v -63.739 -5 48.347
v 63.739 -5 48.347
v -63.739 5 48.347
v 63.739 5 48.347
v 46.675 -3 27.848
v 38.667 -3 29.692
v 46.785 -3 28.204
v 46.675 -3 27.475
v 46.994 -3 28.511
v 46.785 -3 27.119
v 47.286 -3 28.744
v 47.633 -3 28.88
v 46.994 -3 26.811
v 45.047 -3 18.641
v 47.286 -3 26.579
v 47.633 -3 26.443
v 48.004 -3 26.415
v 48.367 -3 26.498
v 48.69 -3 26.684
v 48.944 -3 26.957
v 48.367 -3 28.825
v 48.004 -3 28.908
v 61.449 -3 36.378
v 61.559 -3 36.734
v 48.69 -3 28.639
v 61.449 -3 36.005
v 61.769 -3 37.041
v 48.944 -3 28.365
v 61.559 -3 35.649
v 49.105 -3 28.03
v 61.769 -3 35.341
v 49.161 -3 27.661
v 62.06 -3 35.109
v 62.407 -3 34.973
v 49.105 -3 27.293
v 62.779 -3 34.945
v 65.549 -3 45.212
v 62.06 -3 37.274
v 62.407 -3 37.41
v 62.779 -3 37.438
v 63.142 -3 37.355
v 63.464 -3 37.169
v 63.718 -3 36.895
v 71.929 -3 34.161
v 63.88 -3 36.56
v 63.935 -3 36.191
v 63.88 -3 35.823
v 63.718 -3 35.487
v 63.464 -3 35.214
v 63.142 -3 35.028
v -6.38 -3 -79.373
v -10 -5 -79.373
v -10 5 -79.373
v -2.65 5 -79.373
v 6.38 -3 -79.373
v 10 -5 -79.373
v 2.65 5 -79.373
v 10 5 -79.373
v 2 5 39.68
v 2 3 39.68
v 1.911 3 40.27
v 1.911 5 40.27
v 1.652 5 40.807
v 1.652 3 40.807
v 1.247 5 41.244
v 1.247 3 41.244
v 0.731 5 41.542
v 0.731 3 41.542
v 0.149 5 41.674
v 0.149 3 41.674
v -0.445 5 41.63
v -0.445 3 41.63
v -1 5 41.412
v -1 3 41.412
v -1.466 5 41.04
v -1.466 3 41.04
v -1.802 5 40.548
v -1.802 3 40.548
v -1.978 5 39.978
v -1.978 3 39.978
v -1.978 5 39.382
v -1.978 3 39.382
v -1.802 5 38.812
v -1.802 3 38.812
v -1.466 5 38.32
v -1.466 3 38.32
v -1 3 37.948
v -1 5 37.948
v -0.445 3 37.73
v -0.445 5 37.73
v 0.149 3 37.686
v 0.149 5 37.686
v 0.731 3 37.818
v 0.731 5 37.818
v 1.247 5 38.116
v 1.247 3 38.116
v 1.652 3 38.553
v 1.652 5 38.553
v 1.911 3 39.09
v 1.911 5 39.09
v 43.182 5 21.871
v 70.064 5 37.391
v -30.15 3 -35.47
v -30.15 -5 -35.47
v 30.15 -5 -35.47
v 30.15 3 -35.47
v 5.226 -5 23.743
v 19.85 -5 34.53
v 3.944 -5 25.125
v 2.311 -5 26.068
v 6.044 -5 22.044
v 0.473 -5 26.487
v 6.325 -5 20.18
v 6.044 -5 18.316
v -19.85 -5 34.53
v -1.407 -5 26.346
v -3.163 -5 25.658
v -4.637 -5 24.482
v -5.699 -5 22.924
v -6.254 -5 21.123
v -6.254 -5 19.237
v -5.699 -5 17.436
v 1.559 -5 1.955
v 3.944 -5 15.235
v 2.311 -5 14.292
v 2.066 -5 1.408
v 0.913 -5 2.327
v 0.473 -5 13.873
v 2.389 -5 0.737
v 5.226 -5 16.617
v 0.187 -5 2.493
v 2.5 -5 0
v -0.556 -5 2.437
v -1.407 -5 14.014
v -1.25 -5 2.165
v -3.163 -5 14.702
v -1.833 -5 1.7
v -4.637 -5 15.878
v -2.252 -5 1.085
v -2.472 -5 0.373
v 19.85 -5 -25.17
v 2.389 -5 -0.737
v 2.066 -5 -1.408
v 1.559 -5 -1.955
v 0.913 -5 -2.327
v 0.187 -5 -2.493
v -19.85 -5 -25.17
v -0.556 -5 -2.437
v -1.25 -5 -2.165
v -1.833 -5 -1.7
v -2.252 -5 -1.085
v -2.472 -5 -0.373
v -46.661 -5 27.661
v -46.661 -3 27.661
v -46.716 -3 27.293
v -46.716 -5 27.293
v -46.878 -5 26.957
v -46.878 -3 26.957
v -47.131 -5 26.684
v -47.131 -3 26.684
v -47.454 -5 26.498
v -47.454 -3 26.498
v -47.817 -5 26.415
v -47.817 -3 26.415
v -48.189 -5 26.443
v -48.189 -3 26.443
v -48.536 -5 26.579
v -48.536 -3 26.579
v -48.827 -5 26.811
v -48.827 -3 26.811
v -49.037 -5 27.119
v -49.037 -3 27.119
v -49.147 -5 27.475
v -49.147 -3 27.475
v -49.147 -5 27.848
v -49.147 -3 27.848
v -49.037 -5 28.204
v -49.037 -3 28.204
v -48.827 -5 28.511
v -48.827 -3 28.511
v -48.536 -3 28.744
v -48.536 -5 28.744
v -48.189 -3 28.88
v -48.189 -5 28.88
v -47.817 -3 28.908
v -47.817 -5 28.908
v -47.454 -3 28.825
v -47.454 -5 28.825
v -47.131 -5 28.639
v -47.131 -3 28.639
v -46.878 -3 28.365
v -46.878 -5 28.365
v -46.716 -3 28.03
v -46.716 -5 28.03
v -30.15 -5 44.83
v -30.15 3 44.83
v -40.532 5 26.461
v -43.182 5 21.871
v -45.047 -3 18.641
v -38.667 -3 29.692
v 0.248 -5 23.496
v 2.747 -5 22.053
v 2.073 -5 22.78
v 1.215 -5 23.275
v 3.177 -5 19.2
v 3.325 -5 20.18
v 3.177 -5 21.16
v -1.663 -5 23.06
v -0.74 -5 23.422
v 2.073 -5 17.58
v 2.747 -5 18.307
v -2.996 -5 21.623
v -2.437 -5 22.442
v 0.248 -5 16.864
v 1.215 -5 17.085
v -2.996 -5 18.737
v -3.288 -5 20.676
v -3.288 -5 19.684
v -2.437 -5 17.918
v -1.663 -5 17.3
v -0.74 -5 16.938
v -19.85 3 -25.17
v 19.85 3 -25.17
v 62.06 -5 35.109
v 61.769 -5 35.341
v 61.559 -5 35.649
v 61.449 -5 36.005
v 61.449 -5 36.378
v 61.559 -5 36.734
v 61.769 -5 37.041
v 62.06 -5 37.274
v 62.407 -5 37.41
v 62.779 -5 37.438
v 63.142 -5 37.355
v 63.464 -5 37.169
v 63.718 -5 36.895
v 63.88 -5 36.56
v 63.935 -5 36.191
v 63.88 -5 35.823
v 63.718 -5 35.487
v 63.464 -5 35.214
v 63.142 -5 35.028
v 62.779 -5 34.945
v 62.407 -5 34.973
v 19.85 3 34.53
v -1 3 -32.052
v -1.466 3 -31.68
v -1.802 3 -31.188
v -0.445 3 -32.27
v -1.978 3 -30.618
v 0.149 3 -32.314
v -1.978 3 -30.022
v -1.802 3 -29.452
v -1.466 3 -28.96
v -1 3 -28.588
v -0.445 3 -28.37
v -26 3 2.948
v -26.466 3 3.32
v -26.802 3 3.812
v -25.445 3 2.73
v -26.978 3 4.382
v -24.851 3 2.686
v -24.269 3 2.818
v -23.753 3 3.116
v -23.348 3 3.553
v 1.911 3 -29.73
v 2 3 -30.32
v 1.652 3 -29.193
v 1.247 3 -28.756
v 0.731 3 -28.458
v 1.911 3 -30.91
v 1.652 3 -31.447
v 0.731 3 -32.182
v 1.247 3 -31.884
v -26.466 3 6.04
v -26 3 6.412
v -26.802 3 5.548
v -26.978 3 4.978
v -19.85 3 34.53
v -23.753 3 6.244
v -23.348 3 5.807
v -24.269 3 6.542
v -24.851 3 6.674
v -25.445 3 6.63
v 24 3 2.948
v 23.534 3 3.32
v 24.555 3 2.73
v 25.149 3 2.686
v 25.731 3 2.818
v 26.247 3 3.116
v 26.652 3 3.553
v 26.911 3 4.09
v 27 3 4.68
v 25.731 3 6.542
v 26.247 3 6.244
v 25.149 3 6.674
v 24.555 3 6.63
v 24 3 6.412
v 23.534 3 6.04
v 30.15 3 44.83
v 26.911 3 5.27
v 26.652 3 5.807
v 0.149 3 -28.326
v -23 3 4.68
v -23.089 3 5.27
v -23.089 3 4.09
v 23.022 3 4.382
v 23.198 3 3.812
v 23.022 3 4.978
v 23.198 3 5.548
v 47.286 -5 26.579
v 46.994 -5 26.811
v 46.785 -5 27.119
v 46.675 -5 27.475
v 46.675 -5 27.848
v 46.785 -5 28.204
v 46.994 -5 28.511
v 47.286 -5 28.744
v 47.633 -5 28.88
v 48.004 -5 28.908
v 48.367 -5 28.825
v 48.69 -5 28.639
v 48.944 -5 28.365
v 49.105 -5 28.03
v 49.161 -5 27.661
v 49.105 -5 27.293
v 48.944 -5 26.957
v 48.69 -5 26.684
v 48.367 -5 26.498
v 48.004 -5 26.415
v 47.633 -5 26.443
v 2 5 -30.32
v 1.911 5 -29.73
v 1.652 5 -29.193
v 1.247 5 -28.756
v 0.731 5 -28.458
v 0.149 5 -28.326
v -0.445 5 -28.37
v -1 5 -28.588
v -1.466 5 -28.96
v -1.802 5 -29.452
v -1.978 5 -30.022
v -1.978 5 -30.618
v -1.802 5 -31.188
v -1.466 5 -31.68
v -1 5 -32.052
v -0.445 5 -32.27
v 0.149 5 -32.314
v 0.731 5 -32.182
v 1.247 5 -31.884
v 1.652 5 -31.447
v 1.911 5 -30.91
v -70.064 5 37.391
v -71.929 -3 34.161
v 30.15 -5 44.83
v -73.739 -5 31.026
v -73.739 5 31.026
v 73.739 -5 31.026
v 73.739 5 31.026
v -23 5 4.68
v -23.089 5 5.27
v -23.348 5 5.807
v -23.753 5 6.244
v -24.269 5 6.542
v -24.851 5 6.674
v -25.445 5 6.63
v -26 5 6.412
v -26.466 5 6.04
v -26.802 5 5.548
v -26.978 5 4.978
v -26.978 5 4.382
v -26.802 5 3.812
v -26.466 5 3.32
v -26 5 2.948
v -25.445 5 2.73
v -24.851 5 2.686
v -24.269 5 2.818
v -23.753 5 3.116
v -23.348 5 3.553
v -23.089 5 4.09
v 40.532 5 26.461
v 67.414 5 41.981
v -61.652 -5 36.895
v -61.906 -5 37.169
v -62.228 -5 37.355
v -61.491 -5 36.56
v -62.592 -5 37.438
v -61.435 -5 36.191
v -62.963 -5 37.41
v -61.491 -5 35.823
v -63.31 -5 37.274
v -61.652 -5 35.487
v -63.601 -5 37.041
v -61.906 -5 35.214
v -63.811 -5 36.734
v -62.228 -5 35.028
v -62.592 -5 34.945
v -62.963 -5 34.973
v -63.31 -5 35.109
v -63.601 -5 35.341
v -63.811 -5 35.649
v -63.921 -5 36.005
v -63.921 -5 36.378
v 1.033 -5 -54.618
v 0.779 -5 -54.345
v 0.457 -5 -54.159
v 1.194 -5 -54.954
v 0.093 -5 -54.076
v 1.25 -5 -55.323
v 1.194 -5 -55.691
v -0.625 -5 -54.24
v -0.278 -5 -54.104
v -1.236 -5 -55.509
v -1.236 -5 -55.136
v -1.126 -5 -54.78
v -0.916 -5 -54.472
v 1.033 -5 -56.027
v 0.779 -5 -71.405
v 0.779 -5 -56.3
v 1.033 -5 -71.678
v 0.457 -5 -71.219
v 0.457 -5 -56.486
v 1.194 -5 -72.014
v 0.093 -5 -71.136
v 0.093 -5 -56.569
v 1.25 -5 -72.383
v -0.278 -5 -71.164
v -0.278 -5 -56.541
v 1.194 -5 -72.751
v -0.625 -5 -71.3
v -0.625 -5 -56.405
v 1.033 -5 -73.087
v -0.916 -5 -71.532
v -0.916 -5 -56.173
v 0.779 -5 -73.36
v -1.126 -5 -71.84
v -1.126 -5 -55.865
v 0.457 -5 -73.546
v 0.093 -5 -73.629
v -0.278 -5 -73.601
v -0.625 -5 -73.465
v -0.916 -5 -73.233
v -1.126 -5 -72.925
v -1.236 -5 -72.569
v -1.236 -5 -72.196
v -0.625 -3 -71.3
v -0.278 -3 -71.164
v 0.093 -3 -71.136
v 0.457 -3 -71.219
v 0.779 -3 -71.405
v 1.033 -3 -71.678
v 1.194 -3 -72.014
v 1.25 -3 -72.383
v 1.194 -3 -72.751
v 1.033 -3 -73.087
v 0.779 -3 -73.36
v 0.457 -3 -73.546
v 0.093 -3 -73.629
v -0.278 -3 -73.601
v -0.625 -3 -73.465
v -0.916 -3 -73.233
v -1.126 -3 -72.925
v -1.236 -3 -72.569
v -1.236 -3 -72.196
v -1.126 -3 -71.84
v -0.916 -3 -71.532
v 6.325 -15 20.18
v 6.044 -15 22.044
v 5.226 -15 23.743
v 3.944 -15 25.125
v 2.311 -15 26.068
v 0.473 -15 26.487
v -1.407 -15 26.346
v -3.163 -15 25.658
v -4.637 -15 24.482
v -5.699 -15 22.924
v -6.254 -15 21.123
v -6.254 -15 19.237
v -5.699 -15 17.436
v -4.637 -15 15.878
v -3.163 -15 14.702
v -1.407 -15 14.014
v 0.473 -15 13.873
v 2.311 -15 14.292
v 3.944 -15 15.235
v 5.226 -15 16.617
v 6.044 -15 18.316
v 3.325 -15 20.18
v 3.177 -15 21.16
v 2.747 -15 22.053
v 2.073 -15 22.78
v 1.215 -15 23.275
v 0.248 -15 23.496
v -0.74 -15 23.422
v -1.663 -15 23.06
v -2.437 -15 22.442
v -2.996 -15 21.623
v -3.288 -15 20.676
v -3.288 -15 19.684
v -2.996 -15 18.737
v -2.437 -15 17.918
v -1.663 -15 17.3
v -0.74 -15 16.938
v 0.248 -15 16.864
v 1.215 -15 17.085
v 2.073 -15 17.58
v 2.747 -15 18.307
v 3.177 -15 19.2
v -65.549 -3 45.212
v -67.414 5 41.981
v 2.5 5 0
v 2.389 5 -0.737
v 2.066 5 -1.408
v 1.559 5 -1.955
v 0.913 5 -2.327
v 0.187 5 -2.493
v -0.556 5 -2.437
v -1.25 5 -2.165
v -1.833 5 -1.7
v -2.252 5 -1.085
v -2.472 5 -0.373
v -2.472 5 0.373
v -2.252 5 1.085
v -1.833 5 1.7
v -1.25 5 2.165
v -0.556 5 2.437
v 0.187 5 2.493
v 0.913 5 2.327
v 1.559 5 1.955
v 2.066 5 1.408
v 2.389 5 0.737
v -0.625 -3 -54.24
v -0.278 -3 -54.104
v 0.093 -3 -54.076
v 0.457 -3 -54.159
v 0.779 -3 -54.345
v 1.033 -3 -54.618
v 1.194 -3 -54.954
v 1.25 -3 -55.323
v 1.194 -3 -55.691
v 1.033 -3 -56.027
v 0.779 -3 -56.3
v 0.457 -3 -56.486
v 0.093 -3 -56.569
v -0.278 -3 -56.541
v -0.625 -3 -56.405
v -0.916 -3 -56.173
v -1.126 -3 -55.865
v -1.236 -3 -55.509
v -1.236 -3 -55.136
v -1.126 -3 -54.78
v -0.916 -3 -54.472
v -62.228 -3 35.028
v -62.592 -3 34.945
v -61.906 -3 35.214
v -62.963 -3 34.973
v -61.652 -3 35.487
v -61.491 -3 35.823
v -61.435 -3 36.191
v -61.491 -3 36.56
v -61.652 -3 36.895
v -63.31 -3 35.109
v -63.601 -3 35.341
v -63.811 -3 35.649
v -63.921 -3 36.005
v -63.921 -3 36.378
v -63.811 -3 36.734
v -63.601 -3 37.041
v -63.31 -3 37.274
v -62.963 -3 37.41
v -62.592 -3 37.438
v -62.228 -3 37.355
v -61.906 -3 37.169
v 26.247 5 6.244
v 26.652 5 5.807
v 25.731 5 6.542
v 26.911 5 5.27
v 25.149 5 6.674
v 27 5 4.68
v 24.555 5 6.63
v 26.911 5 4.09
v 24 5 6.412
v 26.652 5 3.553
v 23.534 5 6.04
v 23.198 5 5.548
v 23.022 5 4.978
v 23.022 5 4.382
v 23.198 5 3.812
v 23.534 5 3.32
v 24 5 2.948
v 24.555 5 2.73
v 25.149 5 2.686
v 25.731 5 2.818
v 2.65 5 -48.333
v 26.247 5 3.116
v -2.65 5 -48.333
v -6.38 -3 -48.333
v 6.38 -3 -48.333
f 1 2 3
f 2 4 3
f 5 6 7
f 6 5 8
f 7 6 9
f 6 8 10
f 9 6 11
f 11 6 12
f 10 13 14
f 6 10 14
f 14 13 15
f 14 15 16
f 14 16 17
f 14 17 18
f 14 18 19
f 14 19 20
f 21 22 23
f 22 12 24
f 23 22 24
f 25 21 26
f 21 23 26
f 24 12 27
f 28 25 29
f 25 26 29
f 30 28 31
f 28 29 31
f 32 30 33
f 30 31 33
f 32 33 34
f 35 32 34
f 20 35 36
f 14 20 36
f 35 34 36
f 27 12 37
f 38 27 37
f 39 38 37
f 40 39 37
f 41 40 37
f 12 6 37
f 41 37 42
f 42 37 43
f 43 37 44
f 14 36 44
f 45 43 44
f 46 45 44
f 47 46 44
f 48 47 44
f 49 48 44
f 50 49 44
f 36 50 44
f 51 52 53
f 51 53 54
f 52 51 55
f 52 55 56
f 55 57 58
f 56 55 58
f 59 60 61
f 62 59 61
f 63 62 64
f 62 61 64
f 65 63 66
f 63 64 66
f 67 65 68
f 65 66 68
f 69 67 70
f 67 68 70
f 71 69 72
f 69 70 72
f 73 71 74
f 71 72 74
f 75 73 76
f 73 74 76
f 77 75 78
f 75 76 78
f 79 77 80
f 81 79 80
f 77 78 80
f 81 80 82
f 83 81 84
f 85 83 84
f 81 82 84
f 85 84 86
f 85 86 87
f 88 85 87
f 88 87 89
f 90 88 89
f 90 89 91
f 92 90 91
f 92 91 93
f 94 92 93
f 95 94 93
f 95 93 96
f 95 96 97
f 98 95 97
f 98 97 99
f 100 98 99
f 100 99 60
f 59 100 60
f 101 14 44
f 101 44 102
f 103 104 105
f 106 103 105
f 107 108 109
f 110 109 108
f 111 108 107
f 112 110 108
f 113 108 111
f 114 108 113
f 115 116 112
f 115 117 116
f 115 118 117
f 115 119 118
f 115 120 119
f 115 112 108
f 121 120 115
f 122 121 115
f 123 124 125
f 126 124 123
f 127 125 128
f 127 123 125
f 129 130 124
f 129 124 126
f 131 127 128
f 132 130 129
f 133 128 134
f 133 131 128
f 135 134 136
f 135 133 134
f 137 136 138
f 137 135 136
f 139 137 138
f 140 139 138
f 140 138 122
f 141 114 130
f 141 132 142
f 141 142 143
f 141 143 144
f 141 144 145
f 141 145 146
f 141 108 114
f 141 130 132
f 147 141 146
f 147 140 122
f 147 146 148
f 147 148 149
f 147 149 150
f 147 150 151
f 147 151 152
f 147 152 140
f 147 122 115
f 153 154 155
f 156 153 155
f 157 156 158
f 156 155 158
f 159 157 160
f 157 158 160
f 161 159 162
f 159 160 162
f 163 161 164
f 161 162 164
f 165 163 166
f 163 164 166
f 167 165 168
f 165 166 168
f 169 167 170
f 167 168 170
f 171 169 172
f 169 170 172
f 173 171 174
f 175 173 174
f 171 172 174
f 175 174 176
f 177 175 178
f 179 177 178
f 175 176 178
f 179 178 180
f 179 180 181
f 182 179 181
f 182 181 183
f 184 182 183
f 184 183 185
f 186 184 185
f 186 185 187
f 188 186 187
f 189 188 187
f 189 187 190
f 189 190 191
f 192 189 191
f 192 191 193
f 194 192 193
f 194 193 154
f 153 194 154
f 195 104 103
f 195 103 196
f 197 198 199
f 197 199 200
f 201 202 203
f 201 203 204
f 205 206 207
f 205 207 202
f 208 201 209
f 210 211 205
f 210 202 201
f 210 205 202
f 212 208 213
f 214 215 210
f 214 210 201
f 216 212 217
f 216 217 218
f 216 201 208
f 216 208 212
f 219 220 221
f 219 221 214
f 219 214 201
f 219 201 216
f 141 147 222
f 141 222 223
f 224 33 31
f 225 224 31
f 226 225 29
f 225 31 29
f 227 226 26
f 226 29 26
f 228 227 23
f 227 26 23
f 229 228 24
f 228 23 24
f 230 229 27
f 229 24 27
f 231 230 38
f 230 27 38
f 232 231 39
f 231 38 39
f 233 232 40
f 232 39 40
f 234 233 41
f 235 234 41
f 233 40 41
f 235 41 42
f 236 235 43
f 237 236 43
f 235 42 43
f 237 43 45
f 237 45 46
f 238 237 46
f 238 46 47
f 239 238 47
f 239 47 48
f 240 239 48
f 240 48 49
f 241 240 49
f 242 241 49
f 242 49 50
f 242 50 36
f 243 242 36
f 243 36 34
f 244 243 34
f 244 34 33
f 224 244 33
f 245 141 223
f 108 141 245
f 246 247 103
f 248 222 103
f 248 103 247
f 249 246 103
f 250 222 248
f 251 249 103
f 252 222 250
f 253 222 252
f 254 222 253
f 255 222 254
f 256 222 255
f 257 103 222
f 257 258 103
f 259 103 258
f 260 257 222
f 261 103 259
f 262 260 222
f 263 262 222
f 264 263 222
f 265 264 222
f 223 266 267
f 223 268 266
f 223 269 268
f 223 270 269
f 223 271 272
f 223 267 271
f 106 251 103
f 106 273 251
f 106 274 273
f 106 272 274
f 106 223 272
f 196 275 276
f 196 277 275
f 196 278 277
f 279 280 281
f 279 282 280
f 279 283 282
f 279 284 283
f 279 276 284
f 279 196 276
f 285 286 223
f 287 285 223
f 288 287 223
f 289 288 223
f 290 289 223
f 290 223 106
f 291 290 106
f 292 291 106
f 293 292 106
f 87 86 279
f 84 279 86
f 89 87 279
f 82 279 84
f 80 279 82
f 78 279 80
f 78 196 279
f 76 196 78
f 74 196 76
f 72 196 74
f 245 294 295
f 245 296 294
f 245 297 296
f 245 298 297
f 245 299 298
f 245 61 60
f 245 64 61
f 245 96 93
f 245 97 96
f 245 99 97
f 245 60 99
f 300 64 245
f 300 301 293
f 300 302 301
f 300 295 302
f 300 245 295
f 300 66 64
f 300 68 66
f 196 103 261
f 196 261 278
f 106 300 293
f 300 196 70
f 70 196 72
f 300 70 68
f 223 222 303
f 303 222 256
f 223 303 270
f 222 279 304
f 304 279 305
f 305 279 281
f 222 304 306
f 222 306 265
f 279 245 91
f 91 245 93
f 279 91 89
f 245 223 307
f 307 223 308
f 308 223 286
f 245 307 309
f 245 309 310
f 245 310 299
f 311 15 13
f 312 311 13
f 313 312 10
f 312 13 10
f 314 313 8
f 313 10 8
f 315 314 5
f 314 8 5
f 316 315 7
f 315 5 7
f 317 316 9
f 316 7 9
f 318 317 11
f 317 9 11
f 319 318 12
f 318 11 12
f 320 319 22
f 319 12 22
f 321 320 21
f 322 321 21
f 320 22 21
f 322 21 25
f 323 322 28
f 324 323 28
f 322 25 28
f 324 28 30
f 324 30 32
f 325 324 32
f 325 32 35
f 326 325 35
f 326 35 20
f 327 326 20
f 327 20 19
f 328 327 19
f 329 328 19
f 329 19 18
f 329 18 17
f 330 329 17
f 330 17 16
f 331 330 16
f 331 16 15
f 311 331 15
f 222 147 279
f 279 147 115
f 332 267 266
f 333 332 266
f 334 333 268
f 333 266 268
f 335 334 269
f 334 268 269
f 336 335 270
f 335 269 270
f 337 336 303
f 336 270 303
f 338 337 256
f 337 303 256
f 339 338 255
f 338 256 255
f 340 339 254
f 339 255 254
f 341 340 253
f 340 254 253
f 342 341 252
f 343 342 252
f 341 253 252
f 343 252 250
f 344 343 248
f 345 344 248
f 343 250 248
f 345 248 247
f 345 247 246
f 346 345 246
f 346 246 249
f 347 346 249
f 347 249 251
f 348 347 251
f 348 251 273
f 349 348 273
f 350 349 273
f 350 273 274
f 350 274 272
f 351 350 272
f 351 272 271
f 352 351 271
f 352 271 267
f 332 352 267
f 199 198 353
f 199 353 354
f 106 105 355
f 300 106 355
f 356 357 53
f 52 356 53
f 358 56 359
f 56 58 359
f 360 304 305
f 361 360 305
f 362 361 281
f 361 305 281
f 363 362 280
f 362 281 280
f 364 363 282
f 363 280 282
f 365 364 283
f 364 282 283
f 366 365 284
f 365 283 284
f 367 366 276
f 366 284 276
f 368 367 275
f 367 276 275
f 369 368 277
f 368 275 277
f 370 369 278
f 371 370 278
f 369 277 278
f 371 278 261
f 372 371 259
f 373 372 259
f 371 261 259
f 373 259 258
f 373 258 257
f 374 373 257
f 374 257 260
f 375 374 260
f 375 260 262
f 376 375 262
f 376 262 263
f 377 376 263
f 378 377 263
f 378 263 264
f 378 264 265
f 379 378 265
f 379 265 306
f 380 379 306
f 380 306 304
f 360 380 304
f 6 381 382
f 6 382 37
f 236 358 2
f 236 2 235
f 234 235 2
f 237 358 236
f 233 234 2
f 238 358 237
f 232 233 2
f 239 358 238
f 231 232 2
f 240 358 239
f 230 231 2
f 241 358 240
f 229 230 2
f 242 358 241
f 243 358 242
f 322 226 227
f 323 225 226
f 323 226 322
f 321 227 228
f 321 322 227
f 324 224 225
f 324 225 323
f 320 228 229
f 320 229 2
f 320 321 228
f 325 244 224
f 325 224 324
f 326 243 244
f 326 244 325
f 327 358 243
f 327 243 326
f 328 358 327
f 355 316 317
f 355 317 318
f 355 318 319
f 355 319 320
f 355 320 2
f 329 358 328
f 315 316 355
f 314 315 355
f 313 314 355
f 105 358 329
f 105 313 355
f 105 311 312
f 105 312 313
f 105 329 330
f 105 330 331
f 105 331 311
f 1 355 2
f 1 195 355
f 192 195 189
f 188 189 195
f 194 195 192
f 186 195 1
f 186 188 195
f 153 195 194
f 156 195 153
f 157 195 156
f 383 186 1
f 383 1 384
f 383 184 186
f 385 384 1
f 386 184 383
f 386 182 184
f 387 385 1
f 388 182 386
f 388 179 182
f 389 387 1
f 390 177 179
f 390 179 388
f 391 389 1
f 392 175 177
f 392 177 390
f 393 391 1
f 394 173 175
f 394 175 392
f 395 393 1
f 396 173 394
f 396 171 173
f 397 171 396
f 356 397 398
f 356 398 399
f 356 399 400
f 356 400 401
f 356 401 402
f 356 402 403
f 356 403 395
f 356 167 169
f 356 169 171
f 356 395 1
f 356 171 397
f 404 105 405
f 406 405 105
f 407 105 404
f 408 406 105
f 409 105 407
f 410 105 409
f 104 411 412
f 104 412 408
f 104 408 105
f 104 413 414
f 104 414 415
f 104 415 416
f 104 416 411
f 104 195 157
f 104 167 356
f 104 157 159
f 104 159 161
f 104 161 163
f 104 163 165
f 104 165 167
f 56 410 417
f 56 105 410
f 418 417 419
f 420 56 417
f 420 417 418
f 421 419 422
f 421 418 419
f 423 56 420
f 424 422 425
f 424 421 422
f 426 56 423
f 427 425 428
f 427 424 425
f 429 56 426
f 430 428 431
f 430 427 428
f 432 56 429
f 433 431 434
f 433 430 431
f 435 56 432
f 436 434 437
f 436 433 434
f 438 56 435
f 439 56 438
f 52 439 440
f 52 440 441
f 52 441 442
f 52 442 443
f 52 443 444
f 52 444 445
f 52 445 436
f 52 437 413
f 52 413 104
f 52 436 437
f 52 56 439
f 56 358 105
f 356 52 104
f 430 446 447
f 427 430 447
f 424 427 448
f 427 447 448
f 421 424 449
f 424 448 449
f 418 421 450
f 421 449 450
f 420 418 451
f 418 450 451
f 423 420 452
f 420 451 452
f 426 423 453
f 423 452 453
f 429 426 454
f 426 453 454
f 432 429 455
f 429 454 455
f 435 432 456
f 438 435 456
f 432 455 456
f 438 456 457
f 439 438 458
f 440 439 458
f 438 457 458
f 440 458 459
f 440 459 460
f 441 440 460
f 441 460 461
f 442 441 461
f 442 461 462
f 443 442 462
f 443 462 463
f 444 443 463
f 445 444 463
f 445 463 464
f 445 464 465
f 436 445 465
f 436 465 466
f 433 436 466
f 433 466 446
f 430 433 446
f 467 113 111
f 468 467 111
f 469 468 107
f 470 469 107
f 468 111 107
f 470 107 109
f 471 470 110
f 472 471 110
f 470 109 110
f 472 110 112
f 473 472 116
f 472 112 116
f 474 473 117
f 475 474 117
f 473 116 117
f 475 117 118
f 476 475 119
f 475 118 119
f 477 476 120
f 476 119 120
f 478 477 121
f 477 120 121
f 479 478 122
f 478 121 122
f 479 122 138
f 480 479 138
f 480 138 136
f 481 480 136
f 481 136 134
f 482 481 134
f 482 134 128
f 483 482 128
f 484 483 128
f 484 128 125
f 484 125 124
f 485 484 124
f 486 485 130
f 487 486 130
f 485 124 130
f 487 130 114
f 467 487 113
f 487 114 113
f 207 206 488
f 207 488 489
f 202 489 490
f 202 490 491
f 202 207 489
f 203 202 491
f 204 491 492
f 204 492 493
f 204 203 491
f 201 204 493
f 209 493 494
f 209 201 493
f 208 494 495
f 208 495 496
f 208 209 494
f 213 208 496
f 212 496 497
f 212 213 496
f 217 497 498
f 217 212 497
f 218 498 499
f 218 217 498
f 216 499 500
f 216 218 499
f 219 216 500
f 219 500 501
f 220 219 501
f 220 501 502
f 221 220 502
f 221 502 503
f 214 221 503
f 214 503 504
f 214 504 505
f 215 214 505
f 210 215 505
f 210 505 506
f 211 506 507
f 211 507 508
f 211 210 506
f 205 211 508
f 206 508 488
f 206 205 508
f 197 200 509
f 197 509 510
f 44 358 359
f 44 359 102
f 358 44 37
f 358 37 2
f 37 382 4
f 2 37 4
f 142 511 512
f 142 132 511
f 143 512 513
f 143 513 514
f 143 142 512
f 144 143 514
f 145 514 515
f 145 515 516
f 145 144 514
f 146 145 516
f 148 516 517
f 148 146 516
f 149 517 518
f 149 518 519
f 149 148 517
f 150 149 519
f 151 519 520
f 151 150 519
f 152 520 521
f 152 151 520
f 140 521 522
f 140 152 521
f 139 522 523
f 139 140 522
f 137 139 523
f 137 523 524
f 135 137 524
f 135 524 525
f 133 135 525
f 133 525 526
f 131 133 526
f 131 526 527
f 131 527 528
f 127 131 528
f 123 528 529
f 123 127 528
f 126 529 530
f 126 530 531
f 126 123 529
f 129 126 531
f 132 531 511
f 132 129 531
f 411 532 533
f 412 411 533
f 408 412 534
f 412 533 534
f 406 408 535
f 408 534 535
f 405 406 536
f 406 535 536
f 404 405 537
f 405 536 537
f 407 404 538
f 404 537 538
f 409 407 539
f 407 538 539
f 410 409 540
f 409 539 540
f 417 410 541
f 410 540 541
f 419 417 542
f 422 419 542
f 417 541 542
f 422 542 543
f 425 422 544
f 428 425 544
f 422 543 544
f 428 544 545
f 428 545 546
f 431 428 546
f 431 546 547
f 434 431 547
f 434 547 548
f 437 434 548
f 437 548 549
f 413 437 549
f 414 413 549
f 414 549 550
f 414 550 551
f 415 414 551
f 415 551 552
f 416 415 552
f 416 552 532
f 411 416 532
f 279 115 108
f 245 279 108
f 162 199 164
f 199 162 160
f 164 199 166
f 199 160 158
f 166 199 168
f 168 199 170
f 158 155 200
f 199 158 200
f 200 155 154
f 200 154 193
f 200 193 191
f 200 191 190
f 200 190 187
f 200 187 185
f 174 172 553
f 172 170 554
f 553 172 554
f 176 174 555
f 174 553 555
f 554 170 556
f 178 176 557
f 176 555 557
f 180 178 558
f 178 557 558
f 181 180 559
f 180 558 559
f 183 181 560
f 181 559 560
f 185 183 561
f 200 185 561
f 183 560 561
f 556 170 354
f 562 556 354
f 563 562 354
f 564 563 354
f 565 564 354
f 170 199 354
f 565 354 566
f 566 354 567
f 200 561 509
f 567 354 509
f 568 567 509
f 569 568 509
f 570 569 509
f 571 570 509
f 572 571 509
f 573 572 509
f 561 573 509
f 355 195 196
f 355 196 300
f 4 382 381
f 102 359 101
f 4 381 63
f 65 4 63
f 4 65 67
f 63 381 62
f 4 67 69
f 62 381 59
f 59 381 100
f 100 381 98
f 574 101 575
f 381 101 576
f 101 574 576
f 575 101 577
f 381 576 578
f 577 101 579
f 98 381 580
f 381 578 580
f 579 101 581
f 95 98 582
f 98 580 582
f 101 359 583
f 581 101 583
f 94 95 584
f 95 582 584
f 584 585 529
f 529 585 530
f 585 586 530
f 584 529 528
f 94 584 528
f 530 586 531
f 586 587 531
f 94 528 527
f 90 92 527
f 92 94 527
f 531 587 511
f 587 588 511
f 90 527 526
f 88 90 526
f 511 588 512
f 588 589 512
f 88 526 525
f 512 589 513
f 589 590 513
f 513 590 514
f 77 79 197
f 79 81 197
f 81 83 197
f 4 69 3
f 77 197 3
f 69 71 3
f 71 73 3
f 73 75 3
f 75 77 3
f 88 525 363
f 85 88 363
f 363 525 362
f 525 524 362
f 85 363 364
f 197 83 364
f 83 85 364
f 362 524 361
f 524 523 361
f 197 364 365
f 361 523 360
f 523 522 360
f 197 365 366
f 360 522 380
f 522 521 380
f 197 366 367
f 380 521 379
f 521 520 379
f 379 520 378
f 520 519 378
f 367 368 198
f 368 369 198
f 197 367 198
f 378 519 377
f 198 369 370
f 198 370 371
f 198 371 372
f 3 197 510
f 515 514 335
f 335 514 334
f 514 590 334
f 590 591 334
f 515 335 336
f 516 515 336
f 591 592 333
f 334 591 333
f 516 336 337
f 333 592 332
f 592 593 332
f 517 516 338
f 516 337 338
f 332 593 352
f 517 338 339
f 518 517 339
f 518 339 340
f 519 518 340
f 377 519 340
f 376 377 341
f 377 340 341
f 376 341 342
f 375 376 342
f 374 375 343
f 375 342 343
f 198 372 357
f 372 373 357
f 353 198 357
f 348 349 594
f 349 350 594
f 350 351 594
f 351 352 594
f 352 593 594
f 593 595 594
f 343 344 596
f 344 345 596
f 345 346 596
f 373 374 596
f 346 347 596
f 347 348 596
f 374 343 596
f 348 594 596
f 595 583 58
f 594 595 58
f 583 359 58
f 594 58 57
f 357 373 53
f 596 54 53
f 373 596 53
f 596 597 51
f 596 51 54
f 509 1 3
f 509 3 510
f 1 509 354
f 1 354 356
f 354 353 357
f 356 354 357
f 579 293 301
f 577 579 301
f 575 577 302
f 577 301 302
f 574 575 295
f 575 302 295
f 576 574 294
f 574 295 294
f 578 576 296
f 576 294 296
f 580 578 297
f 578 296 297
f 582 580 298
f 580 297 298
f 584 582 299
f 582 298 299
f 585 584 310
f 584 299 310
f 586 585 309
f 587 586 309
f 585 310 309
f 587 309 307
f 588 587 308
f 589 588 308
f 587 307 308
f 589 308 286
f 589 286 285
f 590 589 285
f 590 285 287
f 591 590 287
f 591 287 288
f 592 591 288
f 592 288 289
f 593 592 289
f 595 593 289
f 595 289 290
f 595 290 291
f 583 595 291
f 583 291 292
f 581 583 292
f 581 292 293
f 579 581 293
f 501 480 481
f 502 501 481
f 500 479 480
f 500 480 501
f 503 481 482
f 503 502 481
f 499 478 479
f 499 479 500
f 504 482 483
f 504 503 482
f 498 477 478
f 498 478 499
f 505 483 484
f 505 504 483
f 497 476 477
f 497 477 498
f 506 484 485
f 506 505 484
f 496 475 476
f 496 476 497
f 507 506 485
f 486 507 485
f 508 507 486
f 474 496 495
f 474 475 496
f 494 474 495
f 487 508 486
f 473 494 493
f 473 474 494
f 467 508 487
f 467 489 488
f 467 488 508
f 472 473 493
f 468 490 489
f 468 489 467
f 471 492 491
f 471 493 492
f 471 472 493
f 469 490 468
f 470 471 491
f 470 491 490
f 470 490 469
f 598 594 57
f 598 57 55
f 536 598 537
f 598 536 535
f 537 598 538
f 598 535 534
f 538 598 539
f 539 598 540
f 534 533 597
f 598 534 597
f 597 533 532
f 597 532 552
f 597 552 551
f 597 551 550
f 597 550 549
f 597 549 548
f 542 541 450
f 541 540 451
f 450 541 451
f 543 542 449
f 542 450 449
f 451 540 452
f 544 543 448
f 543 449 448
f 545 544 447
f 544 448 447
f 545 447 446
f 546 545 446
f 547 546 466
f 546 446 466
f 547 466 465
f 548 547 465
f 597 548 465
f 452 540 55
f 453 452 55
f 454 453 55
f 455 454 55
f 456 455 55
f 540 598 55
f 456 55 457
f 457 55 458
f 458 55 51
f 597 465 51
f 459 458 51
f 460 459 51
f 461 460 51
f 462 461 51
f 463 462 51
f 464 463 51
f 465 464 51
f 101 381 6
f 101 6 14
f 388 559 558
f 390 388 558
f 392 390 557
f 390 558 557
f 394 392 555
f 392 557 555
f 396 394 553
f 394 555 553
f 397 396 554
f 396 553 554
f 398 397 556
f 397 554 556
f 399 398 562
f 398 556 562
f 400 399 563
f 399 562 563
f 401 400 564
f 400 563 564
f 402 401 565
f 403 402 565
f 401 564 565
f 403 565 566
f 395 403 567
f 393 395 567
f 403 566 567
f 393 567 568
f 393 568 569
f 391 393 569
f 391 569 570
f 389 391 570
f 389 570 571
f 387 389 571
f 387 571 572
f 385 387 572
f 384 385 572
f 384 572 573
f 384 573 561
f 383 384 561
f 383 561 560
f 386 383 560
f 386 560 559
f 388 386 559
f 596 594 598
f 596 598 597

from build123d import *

# Parameters (mm, degrees)
ESQUISSE1_R                  = 2.5
BOSS_EXTRU_1_DEPTH           = 5
ESQUISSE2_R                  = 1.25
ENL_V_MAT_EXTRU_1_DEPTH      = 11
R_P_TITION_CIRCULAIRE1_COUNT = 3
ESQUISSE4_R                  = 2
ENL_V_MAT_EXTRU_3_DEPTH      = 11
ESQUISSE5_W                  = 60.3
ESQUISSE5_H                  = 80.3
ESQUISSE5_W_2                = 39.7
ESQUISSE5_H_2                = 59.7
ENL_V_MAT_EXTRU_4_DEPTH      = 8
ESQUISSE6_R                  = 6.325
ESQUISSE6_R_2                = 3.325
BOSS_EXTRU_2_DEPTH           = 10
ENL_V_MAT_EXTRU_5_DEPTH      = 31.04
R_P_TITION_CIRCULAIRE2_COUNT = 3


with BuildPart() as part:
    # Esquisse1 → Boss.-Extru.1 (new body, symmetric)
    with BuildSketch(Plane(origin=(0, 0, 0), x_dir=(1, 0, 0), z_dir=(0, 1, 0))):
        Polygon((-10, 79.372539332), (10, 79.372539332), (73.738635424, -31.026015628), (63.738635424, -48.346523704), (-63.738635424, -48.346523704), (-73.738635424, -31.026015628), align=None)
        Circle(ESQUISSE1_R, mode=Mode.SUBTRACT)
    extrude(amount=BOSS_EXTRU_1_DEPTH, both=True)

    # Esquisse2 → Enlèv. mat.-Extru.1 (cut, through all)
    with BuildSketch(Plane(origin=(0, 5, 0), x_dir=(1, 0, 0), z_dir=(0, 1, 0))):
        with Locations((-62.685117852, -36.191269666)):
            Circle(ESQUISSE2_R)
        with Locations((-47.910724463, -27.661269666)):
            Circle(ESQUISSE2_R)
    enl_v_mat_extru_1 = extrude(amount=-ENL_V_MAT_EXTRU_1_DEPTH, mode=Mode.SUBTRACT)

    # Répétition circulaire1: Enlèv. mat.-Extru.1 ×3 about axis
    r_p_tition_circulaire1_axis = Axis((0, 0, 0), (0, 1, 0))
    for i in range(1, R_P_TITION_CIRCULAIRE1_COUNT):
        add(enl_v_mat_extru_1.rotate(r_p_tition_circulaire1_axis, i * 360 / R_P_TITION_CIRCULAIRE1_COUNT), mode=Mode.SUBTRACT)

    # Esquisse4 → Enlèv. mat.-Extru.3 (cut, through all)
    with BuildSketch(Plane.XZ.offset(5)):
        with Locations((0, -30.32)):
            Circle(ESQUISSE4_R)
        with Locations((0, 39.68)):
            Circle(ESQUISSE4_R)
        with Locations((25, 4.68)):
            Circle(ESQUISSE4_R)
        with Locations((-25, 4.68)):
            Circle(ESQUISSE4_R)
    extrude(amount=-ENL_V_MAT_EXTRU_3_DEPTH, mode=Mode.SUBTRACT)

    # Esquisse5 → Enlèv. mat.-Extru.4 (cut)
    with BuildSketch(Plane.XZ.offset(5)):
        with Locations((0, 4.68)):
            Rectangle(ESQUISSE5_W, ESQUISSE5_H)
        with Locations((0, 4.68)):
            Rectangle(ESQUISSE5_W_2, ESQUISSE5_H_2, mode=Mode.SUBTRACT)
    extrude(amount=-ENL_V_MAT_EXTRU_4_DEPTH, mode=Mode.SUBTRACT)

    # Esquisse6 → Boss.-Extru.2 (add)
    with BuildSketch(Plane.XZ.offset(5)):
        with Locations((0, 20.18)):
            Circle(ESQUISSE6_R)
        with Locations((0, 20.18)):
            Circle(ESQUISSE6_R_2, mode=Mode.SUBTRACT)
    extrude(amount=BOSS_EXTRU_2_DEPTH)

    # Esquisse7 → Enlèv. mat.-Extru.5 (cut)
    with BuildSketch(Plane(origin=(-68.738635424, 0, 39.686269666), x_dir=(0.5, 0, 0.866025404), z_dir=(-0.866025404, 0, 0.5))):
        Polygon((-2.65, 5), (-6.38, -3), (6.38, -3), (2.65, 5), align=None)
    enl_v_mat_extru_5 = extrude(amount=-ENL_V_MAT_EXTRU_5_DEPTH, mode=Mode.SUBTRACT)

    # Répétition circulaire2: Enlèv. mat.-Extru.5 ×3 about axis
    r_p_tition_circulaire2_axis = Axis((0, 0, 0), (0, 1, 0))
    for i in range(1, R_P_TITION_CIRCULAIRE2_COUNT):
        add(enl_v_mat_extru_5.rotate(r_p_tition_circulaire2_axis, i * 360 / R_P_TITION_CIRCULAIRE2_COUNT), mode=Mode.SUBTRACT)


solid = part.part
